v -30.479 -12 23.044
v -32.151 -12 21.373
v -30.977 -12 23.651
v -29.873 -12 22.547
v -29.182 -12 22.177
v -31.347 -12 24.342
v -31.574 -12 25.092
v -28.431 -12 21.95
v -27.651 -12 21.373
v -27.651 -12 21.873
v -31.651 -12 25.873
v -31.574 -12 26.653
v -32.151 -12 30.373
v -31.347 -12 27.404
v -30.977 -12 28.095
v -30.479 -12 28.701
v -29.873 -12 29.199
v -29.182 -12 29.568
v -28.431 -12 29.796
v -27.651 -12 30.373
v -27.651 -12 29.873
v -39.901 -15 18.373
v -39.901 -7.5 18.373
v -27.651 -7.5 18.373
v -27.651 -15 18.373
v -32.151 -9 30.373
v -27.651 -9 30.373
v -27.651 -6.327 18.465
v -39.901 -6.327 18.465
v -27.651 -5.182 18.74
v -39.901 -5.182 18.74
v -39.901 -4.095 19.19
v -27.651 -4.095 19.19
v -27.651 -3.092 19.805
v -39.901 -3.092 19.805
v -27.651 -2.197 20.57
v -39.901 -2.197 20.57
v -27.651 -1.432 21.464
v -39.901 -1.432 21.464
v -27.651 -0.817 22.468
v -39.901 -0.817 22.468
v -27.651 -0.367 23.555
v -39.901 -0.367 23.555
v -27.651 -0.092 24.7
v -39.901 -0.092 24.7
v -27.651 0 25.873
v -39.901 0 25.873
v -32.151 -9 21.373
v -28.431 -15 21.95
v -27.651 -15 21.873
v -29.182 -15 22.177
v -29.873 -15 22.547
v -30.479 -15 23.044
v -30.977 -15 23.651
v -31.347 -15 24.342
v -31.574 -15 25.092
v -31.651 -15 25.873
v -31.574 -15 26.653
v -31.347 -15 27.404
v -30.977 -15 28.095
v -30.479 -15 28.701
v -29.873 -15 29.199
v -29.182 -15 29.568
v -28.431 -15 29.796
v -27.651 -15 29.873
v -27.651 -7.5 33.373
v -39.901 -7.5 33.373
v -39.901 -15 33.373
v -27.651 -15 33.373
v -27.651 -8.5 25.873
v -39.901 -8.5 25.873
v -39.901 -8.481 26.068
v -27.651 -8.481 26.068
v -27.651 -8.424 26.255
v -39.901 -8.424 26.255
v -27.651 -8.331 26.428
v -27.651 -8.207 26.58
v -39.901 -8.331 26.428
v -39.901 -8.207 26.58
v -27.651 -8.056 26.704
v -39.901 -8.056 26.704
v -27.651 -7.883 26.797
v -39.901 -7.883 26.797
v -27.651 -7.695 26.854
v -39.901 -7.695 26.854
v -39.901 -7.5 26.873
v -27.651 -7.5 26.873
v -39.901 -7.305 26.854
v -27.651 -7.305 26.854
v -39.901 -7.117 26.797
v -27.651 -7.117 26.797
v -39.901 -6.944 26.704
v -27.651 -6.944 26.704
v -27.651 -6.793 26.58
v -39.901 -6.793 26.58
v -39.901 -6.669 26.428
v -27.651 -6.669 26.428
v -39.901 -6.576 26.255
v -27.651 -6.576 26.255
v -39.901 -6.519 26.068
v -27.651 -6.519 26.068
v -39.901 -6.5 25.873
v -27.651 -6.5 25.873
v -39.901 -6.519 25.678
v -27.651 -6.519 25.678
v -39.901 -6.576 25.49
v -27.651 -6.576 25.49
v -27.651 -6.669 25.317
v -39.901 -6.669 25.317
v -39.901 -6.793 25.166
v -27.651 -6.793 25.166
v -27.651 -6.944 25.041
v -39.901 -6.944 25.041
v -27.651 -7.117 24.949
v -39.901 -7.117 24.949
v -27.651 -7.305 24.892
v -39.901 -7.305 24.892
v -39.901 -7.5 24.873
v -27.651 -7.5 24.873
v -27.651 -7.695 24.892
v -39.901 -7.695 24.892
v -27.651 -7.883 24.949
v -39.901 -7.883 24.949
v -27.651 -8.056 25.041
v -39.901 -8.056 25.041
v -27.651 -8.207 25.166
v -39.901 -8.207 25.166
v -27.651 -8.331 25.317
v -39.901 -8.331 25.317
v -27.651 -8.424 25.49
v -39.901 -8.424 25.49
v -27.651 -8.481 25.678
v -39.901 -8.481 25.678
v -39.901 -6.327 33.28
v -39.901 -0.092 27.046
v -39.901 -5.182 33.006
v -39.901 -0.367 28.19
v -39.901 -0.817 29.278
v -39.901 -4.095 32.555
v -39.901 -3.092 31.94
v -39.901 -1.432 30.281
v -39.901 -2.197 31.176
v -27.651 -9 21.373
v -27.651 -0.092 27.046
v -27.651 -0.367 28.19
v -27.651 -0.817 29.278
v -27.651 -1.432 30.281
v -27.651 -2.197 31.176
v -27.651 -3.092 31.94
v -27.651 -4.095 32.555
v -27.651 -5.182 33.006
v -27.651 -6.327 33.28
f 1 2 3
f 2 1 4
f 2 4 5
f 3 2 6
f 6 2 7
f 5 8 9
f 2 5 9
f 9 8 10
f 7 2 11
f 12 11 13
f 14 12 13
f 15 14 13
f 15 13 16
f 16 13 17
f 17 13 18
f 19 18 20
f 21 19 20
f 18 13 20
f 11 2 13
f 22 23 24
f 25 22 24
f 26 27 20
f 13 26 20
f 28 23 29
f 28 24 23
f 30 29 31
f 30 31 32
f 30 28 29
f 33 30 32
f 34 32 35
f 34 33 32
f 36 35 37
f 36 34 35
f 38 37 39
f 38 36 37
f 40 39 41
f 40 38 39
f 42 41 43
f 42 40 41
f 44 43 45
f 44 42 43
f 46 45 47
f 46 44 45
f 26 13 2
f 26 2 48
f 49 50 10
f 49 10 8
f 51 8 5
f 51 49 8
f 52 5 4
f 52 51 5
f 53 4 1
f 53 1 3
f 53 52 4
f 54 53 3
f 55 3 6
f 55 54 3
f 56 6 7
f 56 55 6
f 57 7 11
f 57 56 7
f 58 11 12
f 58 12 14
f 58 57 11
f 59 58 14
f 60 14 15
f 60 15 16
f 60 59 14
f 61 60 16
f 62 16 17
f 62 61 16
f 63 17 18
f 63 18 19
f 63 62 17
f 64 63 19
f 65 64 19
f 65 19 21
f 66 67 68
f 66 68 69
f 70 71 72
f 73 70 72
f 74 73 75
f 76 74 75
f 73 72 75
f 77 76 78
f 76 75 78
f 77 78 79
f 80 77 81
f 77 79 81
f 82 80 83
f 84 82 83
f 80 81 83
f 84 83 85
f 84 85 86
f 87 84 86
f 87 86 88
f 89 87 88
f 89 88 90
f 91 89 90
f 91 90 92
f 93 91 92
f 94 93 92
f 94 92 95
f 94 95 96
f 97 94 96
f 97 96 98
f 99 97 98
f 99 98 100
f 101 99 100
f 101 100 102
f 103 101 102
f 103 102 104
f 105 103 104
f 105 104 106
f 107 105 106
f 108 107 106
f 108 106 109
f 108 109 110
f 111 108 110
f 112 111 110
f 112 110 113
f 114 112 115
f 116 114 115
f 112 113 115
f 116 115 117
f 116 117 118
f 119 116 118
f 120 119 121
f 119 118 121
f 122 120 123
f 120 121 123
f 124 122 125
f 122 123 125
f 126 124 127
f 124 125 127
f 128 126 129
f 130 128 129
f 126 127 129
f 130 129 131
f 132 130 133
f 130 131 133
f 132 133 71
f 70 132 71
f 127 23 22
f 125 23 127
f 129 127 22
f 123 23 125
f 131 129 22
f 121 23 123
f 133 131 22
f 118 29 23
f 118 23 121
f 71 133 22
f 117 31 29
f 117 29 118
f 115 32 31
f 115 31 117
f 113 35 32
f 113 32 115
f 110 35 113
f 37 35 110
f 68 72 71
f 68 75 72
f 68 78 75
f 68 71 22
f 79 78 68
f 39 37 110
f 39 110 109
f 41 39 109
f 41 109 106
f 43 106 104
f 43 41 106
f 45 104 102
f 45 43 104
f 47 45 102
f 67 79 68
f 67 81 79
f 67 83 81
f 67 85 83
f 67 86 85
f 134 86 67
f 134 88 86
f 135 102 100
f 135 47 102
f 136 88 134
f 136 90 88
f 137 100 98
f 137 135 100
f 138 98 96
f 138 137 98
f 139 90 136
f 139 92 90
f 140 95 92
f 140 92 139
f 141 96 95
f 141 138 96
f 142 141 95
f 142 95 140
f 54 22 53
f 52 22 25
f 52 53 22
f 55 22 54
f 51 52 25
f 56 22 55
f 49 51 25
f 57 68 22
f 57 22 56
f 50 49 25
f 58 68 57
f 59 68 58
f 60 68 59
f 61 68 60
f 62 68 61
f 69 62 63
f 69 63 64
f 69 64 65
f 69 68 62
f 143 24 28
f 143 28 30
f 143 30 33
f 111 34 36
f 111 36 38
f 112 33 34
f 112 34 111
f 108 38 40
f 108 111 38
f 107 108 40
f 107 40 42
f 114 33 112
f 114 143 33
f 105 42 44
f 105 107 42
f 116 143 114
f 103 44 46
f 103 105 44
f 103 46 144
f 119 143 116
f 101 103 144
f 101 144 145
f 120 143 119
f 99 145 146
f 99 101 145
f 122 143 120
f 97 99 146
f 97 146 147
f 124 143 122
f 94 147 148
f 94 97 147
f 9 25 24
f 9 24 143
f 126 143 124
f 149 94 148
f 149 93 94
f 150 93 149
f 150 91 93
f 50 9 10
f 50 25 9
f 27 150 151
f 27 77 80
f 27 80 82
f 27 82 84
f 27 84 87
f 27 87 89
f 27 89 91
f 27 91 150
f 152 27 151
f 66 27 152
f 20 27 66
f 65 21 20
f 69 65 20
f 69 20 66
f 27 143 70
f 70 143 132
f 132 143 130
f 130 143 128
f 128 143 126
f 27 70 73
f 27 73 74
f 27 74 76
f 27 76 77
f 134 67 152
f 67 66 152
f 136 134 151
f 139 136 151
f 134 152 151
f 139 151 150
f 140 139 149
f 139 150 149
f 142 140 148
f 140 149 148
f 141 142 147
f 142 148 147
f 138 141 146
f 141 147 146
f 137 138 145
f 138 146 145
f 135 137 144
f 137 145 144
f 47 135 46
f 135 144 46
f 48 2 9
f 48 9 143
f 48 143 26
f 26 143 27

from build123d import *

# Parameters (mm, degrees)
F0_W     = 12.25
F0_H     = 15
F1_DEPTH = 15
F2_R     = 7.49999
F3_R     = 1
F4_DEPTH = 25
F6_DEPTH = 4.5
F8_DEPTH = 3


# Not quite as in the source:
# - a fillet or chamfer is up to 0.001 mm smaller than in the source, because OpenCascade refuses the exact size


with BuildPart() as f1:
    # F0 (on Front) → F1 (new body)
    with BuildSketch(Plane.XZ):
        with Locations((-33.7760131806, 25.872811313)):
            Rectangle(F0_W, F0_H)
    extrude(amount=F1_DEPTH)

    # F2 (radius 7.5 in the source; OpenCascade refuses exactly that, so slightly less here)
    f2_edges = [f1.edges().sort_by_distance(p)[0] for p in [
        (-33.776013, 0, 18.372811),
        (-33.776013, 0, 33.372811),
    ]]
    fillet(f2_edges, radius=F2_R)

    # F3 (on face) → F4 (cut)
    with BuildSketch(Plane(origin=(-39.9010131806, 0, 0), x_dir=(0, -1, 0), z_dir=(-1, 0, 0))):
        with Locations((7.5, 25.872811313)):
            Circle(F3_R)
    extrude(amount=-F4_DEPTH, mode=Mode.SUBTRACT)

    # F5 (on face) → F6 (cut)
    with BuildSketch(Plane.YZ.offset(-27.6510131806)):
        Polygon((-9, 30.372811313), (-15, 30.372811313), (-15, 21.372811313), (-9, 21.372811313), (-9, 25.872811313), align=None)
    extrude(amount=-F6_DEPTH, mode=Mode.SUBTRACT)

    # F7 (on face) → F8 (join)
    with BuildSketch(Plane.XZ.offset(15)):
        with BuildLine():
            Line((-27.6510131806, 30.372811313), (-32.1510131806, 30.372811313))
            Line((-32.1510131806, 30.372811313), (-32.1510131806, 21.372811313))
            Line((-32.1510131806, 21.372811313), (-27.6510131806, 21.372811313))
            Line((-27.6510131806, 21.372811313), (-27.6510131806, 21.872811313))
            ThreePointArc((-27.6510131806, 21.872811313), (-31.6510131806, 25.872811313), (-27.6510131806, 29.872811313))
            Line((-27.6510131806, 29.872811313), (-27.6510131806, 30.372811313))
        make_face()
    extrude(amount=-F8_DEPTH)


solid = f1.part
